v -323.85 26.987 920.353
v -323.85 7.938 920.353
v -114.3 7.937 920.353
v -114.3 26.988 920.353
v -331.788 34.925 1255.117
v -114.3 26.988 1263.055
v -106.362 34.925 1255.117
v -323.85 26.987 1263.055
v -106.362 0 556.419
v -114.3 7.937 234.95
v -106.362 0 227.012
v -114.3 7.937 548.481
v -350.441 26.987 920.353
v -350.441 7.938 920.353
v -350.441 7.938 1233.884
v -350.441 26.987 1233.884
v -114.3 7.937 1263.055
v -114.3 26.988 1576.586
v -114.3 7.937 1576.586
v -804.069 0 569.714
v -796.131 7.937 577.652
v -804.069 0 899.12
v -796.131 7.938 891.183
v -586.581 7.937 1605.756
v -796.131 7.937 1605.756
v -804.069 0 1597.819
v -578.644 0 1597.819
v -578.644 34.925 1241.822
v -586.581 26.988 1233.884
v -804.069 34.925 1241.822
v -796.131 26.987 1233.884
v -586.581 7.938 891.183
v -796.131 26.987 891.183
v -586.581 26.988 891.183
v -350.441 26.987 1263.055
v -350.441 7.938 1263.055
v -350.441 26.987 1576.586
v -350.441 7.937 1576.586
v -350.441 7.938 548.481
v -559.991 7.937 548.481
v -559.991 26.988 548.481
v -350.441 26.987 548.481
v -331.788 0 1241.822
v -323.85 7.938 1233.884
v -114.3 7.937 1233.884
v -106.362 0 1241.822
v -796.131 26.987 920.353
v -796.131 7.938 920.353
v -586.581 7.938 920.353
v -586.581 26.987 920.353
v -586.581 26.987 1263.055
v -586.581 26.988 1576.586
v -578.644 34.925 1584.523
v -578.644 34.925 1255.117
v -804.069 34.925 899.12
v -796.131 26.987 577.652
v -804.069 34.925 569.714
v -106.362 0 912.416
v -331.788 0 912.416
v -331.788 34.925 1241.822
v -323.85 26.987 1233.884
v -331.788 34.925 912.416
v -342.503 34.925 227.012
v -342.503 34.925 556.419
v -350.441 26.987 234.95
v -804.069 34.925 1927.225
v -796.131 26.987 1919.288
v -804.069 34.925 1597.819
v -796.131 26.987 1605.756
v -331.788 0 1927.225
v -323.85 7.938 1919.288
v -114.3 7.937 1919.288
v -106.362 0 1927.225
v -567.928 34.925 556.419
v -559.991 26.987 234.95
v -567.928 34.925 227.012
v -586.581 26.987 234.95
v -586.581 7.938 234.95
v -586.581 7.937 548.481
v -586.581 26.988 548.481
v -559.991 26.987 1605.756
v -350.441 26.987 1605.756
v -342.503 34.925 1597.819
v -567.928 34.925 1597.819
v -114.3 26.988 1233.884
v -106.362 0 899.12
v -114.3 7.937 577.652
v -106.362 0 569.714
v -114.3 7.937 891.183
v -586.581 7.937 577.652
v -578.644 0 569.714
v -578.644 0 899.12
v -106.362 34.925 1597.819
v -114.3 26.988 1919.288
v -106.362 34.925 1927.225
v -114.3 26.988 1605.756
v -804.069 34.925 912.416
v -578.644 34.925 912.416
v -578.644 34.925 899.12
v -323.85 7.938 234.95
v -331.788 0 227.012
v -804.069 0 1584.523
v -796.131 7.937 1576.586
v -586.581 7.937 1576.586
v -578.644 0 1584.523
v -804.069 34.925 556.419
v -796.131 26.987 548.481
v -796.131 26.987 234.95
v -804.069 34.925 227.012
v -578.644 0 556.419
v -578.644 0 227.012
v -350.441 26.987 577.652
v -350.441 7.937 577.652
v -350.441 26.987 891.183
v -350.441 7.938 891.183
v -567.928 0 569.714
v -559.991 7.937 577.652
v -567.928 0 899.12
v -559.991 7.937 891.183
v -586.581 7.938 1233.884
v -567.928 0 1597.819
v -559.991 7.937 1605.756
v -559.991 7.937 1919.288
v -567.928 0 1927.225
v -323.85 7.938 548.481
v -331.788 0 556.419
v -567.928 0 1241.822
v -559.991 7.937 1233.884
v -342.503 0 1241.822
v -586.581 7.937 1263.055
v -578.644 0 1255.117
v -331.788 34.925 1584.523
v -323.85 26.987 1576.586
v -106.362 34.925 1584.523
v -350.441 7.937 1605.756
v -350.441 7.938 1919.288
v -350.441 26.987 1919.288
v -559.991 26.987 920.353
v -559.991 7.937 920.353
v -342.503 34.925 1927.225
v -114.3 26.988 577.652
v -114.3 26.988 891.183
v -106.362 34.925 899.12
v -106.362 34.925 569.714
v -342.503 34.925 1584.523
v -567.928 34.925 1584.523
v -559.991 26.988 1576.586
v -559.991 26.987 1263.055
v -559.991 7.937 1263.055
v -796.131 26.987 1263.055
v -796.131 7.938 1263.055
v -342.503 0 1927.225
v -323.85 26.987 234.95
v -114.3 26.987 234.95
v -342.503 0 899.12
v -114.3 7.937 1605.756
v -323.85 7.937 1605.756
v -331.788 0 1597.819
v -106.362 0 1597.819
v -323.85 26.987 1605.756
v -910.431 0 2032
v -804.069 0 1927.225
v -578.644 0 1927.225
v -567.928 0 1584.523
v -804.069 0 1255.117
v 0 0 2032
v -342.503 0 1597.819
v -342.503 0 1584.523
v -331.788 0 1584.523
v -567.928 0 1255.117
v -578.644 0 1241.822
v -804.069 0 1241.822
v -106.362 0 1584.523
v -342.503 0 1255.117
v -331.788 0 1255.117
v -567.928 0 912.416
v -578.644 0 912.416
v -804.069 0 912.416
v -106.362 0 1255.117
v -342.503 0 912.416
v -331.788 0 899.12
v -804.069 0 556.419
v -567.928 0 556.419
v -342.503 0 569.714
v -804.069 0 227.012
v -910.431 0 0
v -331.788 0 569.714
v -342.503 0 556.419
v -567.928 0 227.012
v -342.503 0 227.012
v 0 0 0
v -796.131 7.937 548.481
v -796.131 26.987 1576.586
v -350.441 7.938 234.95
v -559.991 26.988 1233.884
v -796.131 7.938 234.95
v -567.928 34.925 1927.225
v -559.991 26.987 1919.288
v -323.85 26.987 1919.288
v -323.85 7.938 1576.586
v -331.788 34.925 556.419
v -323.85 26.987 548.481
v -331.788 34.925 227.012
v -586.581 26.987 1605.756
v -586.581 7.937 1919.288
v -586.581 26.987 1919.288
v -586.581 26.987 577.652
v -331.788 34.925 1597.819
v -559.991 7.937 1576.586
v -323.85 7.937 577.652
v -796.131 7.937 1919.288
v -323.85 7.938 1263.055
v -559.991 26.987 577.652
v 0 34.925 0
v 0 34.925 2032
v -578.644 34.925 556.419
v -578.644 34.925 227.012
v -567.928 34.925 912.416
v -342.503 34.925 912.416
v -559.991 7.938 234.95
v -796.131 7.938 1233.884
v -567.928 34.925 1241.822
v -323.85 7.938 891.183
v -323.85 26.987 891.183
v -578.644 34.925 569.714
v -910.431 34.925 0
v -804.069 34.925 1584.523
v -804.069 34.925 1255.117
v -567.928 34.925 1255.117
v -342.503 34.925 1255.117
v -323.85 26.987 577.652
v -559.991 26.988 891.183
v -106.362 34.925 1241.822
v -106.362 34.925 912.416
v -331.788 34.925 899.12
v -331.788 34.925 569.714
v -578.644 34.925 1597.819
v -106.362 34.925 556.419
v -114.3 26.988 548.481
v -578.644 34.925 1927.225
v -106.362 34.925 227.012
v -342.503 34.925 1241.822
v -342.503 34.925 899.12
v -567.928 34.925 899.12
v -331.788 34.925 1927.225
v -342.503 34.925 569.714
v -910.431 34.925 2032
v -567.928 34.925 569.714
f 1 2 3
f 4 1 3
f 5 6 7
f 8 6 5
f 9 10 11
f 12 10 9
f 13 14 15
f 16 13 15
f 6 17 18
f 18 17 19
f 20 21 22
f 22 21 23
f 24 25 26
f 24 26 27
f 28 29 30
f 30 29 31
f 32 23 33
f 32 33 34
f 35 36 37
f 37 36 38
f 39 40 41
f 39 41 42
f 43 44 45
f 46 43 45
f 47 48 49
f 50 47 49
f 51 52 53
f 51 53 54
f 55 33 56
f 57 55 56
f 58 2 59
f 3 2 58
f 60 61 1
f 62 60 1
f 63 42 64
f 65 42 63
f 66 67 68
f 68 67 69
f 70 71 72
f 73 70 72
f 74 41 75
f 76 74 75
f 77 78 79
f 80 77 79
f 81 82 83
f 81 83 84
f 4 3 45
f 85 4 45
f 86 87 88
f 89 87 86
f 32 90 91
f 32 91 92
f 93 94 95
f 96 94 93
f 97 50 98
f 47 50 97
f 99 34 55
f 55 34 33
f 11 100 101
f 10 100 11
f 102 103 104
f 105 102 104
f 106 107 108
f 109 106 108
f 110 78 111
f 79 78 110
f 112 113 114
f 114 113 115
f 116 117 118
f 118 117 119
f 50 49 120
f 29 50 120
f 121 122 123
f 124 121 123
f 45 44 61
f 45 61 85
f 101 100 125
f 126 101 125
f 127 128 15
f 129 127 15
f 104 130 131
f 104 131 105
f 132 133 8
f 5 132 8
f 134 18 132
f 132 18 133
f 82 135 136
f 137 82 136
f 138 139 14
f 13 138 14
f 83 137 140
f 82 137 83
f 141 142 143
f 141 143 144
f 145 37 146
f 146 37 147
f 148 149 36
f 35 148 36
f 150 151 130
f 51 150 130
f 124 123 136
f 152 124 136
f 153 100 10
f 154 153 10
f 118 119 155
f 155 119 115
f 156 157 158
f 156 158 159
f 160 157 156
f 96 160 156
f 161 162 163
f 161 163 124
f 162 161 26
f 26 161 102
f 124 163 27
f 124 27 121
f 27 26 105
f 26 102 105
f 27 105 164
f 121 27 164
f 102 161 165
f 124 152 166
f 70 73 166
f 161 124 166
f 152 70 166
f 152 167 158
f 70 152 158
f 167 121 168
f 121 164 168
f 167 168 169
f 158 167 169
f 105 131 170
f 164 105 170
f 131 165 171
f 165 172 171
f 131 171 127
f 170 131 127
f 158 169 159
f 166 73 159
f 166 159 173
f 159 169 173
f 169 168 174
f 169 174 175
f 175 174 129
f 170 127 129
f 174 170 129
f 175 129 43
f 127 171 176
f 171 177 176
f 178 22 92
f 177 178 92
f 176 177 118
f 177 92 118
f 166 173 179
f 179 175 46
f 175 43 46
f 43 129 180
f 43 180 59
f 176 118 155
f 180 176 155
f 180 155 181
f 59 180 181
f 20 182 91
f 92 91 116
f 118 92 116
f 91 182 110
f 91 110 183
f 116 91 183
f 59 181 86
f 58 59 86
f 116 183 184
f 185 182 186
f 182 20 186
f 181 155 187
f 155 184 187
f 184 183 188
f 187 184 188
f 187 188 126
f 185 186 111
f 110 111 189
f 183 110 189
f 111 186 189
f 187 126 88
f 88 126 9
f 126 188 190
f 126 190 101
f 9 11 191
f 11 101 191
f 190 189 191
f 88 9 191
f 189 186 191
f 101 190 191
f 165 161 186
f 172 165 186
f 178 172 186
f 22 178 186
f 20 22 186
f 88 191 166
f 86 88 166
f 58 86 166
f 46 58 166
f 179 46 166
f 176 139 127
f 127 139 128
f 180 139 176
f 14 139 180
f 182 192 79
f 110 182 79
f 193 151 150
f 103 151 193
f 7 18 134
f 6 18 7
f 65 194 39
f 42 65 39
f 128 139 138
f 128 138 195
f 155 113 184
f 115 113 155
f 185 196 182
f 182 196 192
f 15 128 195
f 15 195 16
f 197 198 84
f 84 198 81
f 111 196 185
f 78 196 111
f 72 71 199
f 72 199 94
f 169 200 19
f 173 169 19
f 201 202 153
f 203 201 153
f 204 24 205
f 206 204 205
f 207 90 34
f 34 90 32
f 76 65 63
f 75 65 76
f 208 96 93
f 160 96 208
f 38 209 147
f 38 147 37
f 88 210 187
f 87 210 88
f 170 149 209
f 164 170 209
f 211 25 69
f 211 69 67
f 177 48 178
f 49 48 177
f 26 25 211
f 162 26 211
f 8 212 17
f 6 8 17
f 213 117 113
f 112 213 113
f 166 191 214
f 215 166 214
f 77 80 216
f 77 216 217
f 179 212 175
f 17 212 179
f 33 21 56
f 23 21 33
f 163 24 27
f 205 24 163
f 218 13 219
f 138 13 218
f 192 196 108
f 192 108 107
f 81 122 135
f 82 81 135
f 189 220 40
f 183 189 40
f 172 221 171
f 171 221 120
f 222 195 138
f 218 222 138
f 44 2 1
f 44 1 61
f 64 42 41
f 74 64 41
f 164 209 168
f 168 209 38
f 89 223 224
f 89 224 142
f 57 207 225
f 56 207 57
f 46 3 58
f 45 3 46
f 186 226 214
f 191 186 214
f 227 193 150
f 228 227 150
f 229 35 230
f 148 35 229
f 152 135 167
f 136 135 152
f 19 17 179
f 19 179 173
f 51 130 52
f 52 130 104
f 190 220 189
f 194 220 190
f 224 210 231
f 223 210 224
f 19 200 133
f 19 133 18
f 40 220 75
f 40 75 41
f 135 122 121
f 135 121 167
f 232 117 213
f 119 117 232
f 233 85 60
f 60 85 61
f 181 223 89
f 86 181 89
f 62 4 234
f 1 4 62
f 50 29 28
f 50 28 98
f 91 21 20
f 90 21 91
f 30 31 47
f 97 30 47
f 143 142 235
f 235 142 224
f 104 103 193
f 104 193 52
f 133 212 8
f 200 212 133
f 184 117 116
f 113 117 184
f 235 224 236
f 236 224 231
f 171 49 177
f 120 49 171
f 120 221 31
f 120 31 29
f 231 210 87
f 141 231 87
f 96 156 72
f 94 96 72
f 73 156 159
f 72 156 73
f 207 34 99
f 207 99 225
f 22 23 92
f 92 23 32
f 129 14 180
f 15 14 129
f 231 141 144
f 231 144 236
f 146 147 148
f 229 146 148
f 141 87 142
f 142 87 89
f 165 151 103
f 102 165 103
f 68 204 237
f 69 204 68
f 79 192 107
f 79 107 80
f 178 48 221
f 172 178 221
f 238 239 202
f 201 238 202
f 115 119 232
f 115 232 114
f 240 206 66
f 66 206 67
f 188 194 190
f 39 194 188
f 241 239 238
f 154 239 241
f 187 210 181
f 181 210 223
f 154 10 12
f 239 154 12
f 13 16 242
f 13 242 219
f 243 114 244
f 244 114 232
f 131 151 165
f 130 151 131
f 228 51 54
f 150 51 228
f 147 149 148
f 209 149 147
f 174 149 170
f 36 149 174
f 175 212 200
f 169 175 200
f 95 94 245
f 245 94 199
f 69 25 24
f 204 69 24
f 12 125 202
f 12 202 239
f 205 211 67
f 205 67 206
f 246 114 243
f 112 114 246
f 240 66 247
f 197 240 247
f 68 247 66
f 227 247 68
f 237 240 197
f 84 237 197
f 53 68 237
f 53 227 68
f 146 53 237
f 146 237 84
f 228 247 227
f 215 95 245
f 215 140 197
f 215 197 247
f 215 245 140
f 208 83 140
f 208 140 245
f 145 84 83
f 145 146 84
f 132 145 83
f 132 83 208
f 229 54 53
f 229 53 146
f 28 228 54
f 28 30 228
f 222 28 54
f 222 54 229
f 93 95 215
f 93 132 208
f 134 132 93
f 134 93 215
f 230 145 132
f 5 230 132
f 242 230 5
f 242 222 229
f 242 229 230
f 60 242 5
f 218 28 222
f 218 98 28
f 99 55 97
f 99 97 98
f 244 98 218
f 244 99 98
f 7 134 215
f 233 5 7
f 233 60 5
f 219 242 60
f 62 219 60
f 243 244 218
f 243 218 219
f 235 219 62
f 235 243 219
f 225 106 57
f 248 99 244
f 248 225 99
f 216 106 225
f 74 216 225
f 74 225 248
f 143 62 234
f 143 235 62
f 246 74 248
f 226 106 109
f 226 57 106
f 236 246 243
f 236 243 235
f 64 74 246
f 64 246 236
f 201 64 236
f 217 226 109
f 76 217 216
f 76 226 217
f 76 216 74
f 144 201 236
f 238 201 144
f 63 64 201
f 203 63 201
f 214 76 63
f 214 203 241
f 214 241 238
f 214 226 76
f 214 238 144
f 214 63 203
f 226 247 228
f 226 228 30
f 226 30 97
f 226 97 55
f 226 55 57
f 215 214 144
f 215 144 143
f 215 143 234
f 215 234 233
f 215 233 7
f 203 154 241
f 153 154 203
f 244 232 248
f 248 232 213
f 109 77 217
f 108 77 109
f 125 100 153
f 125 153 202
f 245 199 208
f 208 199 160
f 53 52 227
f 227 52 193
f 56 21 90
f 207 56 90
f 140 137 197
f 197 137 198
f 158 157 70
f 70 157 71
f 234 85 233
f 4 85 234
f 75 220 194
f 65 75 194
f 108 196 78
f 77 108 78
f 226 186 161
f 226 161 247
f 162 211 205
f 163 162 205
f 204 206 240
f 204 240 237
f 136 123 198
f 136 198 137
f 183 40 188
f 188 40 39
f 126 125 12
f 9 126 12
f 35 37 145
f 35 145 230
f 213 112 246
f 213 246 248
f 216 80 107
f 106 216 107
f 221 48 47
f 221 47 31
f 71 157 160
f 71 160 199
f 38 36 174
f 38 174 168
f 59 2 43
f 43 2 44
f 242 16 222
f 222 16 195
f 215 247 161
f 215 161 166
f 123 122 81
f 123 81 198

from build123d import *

# Parameters (mm, degrees)
F0_W     = 910.43125
F0_H     = 34.925
F1_DEPTH = 2032
F2_W     = 209.55
F2_H     = 313.53125
F3_DEPTH = 34.926
F4_SIZE  = 7.9375


with BuildPart() as f1:
    # F0 (on Top) → F1 (new body)
    with BuildSketch(Plane.XY):
        with Locations((-455.215625, 17.4625)):
            Rectangle(F0_W, F0_H)
    extrude(amount=F1_DEPTH)

    # F2 (on Front) → F3 (cut, through all)
    with BuildSketch(Plane.XZ):
        with Locations((-691.35625, 391.715625)):
            Rectangle(F2_W, F2_H)
        with Locations((-455.215625, 391.715625)):
            Rectangle(F2_W, F2_H)
        with Locations((-219.075, 391.715625)):
            Rectangle(F2_W, F2_H)
        with Locations((-691.35625, 734.417188)):
            Rectangle(F2_W, F2_H)
        with Locations((-455.215625, 734.417188)):
            Rectangle(F2_W, F2_H)
        with Locations((-219.075, 734.417188)):
            Rectangle(F2_W, F2_H)
        with Locations((-691.35625, 1077.11875)):
            Rectangle(F2_W, F2_H)
        with Locations((-455.215625, 1077.11875)):
            Rectangle(F2_W, F2_H)
        with Locations((-219.075, 1077.11875)):
            Rectangle(F2_W, F2_H)
        with Locations((-691.35625, 1419.820313)):
            Rectangle(F2_W, F2_H)
        with Locations((-455.215625, 1419.820313)):
            Rectangle(F2_W, F2_H)
        with Locations((-219.075, 1419.820313)):
            Rectangle(F2_W, F2_H)
        with Locations((-691.35625, 1762.521875)):
            Rectangle(F2_W, F2_H)
        with Locations((-455.215625, 1762.521875)):
            Rectangle(F2_W, F2_H)
        with Locations((-219.075, 1762.521875)):
            Rectangle(F2_W, F2_H)
    extrude(amount=-F3_DEPTH, mode=Mode.SUBTRACT)

    # F4
    f4_edges = [f1.edges().sort_by_distance(p)[0] for p in [
        (-586.58125, 0, 1762.521875),
        (-691.35625, 0, 1605.75625),
        (-559.990625, 0, 1762.521875),
        (-455.215625, 0, 1605.75625),
        (-559.990625, 0, 1419.820313),
        (-691.35625, 0, 1576.585938),
        (-586.58125, 0, 1419.820313),
        (-350.440625, 0, 1762.521875),
        (-455.215625, 0, 1576.585938),
        (-350.440625, 0, 1419.820313),
        (-323.85, 0, 1419.820313),
        (-219.075, 0, 1576.585938),
        (-219.075, 0, 1605.75625),
        (-323.85, 0, 1762.521875),
        (-691.35625, 0, 1263.054688),
        (-691.35625, 0, 1233.884375),
        (-691.35625, 0, 920.353125),
        (-691.35625, 0, 891.182813),
        (-691.35625, 0, 577.651563),
        (-691.35625, 0, 548.48125),
        (-691.35625, 0, 234.95),
        (-691.35625, 0, 1919.2875),
        (-796.13125, 0, 1762.521875),
        (-796.13125, 0, 1419.820312),
        (-796.13125, 0, 1077.11875),
        (-796.13125, 0, 734.417188),
        (-796.13125, 0, 391.715625),
        (-586.58125, 0, 391.715625),
        (-586.58125, 0, 734.417188),
        (-586.58125, 0, 1077.11875),
        (-455.215625, 0, 1919.2875),
        (-219.075, 0, 1919.2875),
        (-114.3, 0, 1762.521875),
        (-114.3, 0, 1419.820312),
        (-114.3, 0, 1077.11875),
        (-114.3, 0, 734.417188),
        (-114.3, 0, 391.715625),
        (-219.075, 0, 234.95),
        (-455.215625, 0, 234.95),
        (-559.990625, 0, 391.715625),
        (-559.990625, 0, 734.417188),
        (-559.990625, 0, 1077.11875),
        (-323.85, 0, 391.715625),
        (-350.440625, 0, 391.715625),
        (-455.215625, 0, 548.48125),
        (-219.075, 0, 548.48125),
        (-219.075, 0, 577.651563),
        (-455.215625, 0, 577.651563),
        (-350.440625, 0, 734.417188),
        (-323.85, 0, 734.417188),
        (-219.075, 0, 891.182813),
        (-455.215625, 0, 891.182813),
        (-455.215625, 0, 920.353125),
        (-219.075, 0, 920.353125),
        (-323.85, 0, 1077.11875),
        (-350.440625, 0, 1077.11875),
        (-455.215625, 0, 1233.884375),
        (-455.215625, 0, 1263.054688),
        (-219.075, 0, 1263.054688),
        (-219.075, 0, 1233.884375),
        (-691.35625, 34.925, 234.95),
        (-455.215625, 34.925, 234.95),
        (-219.075, 34.925, 234.95),
        (-114.3, 34.925, 391.715625),
        (-114.3, 34.925, 734.417188),
        (-114.3, 34.925, 1077.11875),
        (-114.3, 34.925, 1419.820312),
        (-114.3, 34.925, 1762.521875),
        (-219.075, 34.925, 1919.2875),
        (-455.215625, 34.925, 1919.2875),
        (-691.35625, 34.925, 1919.2875),
        (-796.13125, 34.925, 1762.521875),
        (-796.13125, 34.925, 1419.820312),
        (-796.13125, 34.925, 1077.11875),
        (-796.13125, 34.925, 734.417188),
        (-796.13125, 34.925, 391.715625),
        (-586.58125, 34.925, 391.715625),
        (-559.990625, 34.925, 391.715625),
        (-350.440625, 34.925, 391.715625),
        (-323.85, 34.925, 391.715625),
        (-219.075, 34.925, 548.48125),
        (-219.075, 34.925, 577.651563),
        (-455.215625, 34.925, 577.651563),
        (-455.215625, 34.925, 548.48125),
        (-691.35625, 34.925, 548.48125),
        (-691.35625, 34.925, 577.651563),
        (-586.58125, 34.925, 734.417188),
        (-559.990625, 34.925, 734.417188),
        (-350.440625, 34.925, 734.417188),
        (-323.85, 34.925, 734.417188),
        (-219.075, 34.925, 891.182813),
        (-219.075, 34.925, 920.353125),
        (-455.215625, 34.925, 920.353125),
        (-455.215625, 34.925, 891.182813),
        (-691.35625, 34.925, 891.182813),
        (-691.35625, 34.925, 920.353125),
        (-586.58125, 34.925, 1077.11875),
        (-559.990625, 34.925, 1077.11875),
        (-350.440625, 34.925, 1077.11875),
        (-323.85, 34.925, 1077.11875),
        (-691.35625, 34.925, 1233.884375),
        (-455.215625, 34.925, 1233.884375),
        (-219.075, 34.925, 1233.884375),
        (-219.075, 34.925, 1263.054688),
        (-455.215625, 34.925, 1263.054688),
        (-691.35625, 34.925, 1263.054688),
        (-586.58125, 34.925, 1419.820312),
        (-559.990625, 34.925, 1419.820312),
        (-350.440625, 34.925, 1419.820312),
        (-323.85, 34.925, 1419.820312),
        (-219.075, 34.925, 1576.585938),
        (-219.075, 34.925, 1605.75625),
        (-455.215625, 34.925, 1605.75625),
        (-455.215625, 34.925, 1576.585938),
        (-691.35625, 34.925, 1605.75625),
        (-691.35625, 34.925, 1576.585938),
        (-586.58125, 34.925, 1762.521875),
        (-559.990625, 34.925, 1762.521875),
        (-350.440625, 34.925, 1762.521875),
        (-323.85, 34.925, 1762.521875),
    ]]
    chamfer(f4_edges, length=F4_SIZE)


solid = f1.part
